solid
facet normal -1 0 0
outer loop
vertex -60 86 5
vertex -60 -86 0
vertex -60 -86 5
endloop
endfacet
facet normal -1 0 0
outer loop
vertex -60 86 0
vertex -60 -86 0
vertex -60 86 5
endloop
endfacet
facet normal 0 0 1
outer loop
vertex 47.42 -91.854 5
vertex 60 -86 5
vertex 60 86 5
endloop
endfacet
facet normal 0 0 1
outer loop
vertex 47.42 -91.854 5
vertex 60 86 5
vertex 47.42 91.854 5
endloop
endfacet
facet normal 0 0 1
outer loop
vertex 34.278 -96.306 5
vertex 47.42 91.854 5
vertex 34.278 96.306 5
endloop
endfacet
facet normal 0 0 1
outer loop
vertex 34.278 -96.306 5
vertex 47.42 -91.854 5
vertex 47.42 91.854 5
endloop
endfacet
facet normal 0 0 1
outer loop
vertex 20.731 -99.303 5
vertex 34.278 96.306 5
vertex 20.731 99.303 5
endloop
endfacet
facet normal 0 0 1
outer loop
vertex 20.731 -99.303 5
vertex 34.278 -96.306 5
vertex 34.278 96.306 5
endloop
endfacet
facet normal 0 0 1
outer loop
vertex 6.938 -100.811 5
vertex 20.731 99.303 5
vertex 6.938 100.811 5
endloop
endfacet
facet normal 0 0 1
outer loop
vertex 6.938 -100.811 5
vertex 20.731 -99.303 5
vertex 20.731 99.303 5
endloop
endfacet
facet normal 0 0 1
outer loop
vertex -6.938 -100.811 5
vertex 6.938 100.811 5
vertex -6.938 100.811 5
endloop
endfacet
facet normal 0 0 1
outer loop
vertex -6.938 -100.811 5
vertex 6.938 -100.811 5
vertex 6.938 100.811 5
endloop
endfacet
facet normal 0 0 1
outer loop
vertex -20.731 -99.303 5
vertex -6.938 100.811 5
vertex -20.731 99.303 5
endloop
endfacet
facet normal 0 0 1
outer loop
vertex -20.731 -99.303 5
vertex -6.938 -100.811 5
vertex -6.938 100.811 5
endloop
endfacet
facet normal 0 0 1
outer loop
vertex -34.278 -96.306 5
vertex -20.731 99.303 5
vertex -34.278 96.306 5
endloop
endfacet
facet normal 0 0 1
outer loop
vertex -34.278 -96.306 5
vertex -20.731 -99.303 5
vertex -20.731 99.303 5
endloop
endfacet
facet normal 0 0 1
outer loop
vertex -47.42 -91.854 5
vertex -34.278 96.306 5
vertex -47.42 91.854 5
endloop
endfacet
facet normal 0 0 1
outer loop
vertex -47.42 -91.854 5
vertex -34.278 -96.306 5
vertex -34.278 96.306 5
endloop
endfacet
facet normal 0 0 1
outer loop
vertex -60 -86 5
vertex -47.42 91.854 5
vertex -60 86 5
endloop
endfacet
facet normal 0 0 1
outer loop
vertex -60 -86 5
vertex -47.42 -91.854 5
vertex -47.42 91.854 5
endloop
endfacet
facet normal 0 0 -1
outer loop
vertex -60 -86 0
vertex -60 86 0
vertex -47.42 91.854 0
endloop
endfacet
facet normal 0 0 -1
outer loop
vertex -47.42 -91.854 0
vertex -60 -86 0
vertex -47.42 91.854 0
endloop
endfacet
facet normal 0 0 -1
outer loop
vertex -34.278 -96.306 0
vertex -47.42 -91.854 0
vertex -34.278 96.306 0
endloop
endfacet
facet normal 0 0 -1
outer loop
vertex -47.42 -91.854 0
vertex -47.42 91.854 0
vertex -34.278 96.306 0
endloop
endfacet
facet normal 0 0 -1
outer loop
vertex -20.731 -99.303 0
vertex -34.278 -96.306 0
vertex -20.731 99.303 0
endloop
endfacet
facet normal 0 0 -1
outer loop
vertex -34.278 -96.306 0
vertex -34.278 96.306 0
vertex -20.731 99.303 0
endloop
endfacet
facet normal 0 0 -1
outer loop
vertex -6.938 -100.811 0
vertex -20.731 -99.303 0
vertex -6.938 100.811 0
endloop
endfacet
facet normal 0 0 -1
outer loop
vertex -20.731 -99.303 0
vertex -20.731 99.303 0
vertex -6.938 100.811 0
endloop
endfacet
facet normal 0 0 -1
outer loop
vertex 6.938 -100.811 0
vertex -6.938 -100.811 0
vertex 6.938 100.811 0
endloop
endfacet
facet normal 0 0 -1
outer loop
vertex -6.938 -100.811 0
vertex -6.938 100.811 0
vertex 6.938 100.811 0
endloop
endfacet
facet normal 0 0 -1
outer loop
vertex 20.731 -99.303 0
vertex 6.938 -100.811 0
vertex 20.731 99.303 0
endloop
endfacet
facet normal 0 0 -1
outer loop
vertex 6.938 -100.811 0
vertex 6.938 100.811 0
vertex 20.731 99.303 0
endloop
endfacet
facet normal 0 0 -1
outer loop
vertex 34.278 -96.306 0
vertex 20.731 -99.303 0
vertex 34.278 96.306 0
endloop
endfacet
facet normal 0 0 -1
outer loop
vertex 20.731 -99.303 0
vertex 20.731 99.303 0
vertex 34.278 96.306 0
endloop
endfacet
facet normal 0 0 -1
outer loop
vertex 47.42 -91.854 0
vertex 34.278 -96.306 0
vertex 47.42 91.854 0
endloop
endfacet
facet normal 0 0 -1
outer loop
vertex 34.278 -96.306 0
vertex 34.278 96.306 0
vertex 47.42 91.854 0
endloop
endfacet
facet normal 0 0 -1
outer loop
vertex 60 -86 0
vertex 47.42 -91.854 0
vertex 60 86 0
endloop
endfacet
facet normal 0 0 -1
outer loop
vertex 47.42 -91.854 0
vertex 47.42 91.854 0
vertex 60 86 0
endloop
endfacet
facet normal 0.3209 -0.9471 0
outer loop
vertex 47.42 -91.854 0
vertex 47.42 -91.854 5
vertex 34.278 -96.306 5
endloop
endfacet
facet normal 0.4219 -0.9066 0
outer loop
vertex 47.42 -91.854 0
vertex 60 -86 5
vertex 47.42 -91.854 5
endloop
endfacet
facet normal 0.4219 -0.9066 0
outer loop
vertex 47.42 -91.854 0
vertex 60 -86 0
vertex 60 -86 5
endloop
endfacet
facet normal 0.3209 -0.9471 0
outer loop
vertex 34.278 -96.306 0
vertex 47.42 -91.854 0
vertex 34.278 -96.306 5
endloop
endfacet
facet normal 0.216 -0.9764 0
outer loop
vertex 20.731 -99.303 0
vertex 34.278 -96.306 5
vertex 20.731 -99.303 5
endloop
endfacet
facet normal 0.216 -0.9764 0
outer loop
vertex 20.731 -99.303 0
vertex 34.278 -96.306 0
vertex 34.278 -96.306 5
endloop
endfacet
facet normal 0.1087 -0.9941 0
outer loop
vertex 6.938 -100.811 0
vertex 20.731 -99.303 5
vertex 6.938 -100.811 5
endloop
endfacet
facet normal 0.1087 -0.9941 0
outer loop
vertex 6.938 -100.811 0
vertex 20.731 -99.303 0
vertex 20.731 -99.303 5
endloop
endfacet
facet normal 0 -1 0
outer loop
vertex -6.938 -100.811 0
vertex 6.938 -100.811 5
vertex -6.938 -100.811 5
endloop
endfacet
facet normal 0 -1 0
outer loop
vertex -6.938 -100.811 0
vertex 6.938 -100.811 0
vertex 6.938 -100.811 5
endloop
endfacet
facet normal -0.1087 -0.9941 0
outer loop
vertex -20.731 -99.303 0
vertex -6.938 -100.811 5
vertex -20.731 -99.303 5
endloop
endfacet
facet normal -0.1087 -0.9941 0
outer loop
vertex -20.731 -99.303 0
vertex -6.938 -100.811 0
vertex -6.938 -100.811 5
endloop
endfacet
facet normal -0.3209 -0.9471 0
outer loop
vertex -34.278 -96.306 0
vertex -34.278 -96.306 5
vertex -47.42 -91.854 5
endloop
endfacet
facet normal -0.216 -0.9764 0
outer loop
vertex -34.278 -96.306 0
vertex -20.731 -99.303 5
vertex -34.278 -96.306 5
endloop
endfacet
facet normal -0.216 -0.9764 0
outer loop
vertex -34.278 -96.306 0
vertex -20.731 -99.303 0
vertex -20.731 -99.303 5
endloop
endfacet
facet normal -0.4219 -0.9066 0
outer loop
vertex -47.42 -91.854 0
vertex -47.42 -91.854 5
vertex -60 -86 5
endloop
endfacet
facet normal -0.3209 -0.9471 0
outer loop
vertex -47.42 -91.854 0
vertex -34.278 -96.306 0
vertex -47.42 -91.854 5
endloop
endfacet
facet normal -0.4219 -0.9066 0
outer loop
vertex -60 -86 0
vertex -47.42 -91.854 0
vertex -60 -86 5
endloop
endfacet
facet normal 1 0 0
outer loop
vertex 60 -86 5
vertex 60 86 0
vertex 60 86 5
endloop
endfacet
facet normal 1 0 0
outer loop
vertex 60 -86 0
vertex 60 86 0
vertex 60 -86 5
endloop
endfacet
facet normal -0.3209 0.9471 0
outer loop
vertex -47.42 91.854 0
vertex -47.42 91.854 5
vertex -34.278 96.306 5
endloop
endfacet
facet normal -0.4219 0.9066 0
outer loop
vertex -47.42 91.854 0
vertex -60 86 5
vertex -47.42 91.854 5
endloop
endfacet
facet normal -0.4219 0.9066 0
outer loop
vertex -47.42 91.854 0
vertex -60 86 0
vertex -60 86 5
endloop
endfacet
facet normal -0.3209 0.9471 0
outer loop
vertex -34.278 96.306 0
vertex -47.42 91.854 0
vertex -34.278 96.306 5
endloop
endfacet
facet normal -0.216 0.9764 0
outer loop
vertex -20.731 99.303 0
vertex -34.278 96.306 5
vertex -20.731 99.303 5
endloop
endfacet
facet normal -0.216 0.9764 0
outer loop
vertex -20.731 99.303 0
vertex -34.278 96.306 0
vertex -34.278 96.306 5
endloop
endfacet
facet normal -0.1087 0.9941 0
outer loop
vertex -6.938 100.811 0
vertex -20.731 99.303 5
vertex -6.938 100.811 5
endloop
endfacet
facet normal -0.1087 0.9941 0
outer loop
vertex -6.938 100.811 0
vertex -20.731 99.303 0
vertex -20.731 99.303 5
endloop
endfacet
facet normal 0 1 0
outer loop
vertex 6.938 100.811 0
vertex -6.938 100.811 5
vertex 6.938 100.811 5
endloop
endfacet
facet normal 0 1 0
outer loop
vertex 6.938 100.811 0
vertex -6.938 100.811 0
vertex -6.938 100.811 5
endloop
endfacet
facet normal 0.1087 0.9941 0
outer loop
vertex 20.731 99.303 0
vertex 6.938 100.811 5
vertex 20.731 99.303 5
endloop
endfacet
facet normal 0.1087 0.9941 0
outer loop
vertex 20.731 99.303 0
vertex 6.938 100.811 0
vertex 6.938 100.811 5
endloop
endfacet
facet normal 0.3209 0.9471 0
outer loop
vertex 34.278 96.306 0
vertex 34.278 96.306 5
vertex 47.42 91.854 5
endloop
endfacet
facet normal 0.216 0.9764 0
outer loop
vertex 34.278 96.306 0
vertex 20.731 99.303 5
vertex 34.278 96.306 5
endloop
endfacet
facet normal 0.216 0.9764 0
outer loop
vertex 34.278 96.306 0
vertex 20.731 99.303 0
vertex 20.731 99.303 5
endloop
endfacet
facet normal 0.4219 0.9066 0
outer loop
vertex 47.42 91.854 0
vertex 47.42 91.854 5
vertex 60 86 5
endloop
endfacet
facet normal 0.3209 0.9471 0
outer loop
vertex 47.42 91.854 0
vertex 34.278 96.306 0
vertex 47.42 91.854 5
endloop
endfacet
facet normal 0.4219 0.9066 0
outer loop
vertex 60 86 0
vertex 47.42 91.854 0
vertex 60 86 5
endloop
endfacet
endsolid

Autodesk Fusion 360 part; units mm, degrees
sketch "Esquisse1" plane through (0, 0, 0) normal (0, 0, 1) x (1, 0, 0)
  line L0 (60, -86) -> (-60, -86)
  line L1 (-60, -86) -> (-60, 86)
  line L2 (-60, 86) -> (60, 86)
  line L3 (60, 86) -> (60, -86)
  line L4 (60, -86) -> (-60, 86) construction
  line L5 (-60, -86) -> (60, 86) construction
  dimension "d1" = 120
  dimension "d2" = 172
sketch "Esquisse2" plane through (0, 0, 0) normal (0, 0, 1) x (1, 0, 0)
  line L0 (0, -86) -> (0, -101)
  line L1 (0, 86) -> (0, 101)
  line L2 (60, -86) -> (-60, -86)
  line L3 (-60, -86) -> (-60, -116)
  line L4 (-60, -116) -> (60, -116)
  line L5 (60, -116) -> (60, -86)
  line L6 (60, -86) -> (-60, -116) construction
  line L7 (-60, -86) -> (60, -116) construction
  line L8 (-60, 86) -> (60, 86)
  line L9 (60, 86) -> (60, 116)
  line L10 (60, 116) -> (-60, 116)
  line L11 (-60, 116) -> (-60, 86)
  line L12 (-60, 86) -> (60, 116) construction
  line L13 (60, 86) -> (-60, 116) construction
  arc A0 (60, 86) -> (-60, 86) centre (0, -26.5) ccw
  arc A1 (-60, -86) -> (60, -86) centre (0, 26.5) ccw
  point P0 (0, -101)
  point P1 (0, 101)
  dimension "d3" = 15
  dimension "d4" = 15
extrude "Extrusion1" add sketch "Esquisse1" sketch "Esquisse2" along normal blind 10 of sketch 2 contours L0 L2 A1 | L0 L2 A1 | L1 L8 A0 | L1 L8 A0
sketch "Esquisse3" plane through (0, 0, 10) normal (0, 0, 1) x (-1, 0, 0)
  line L0 (60, -86) -> (60, 86)
  arc A0 (60, 86) -> (-60, 86) centre (0, -26.5) ccw
  line L1 (-60, 86) -> (-60, -86)
  arc A1 (-60, -86) -> (60, -86) centre (0, 26.5) ccw
  line L2 (60, 86) -> (-60, 86)
  line L3 (60, -86) -> (-60, -86)
  line L4 (-60, 86) -> (-60, 70)
  line L5 (-60, 70) -> (-60, 48)
  line L6 (-60, 48) -> (-60, -48)
  line L7 (-60, -48) -> (-60, -70)
  line L8 (60, 86) -> (60, 70)
  line L9 (60, 70) -> (60, 48)
  line L10 (60, 48) -> (60, -48)
  line L11 (60, -48) -> (60, -70)
  line L12 (60, 70) -> (36, 70)
  line L13 (36, 70) -> (36, 48)
  line L14 (36, 48) -> (60, 48)
  line L15 (60, -70) -> (36, -70)
  line L16 (36, -70) -> (36, -48)
  line L17 (36, -48) -> (60, -48)
  line L18 (-60, -70) -> (-36, -70)
  line L19 (-36, -70) -> (-36, -48)
  line L20 (-36, -48) -> (-60, -48)
  line L21 (-60, 70) -> (-36, 70)
  line L22 (-36, 70) -> (-36, 48)
  line L23 (-60, 48) -> (-36, 48)
  dimension "d7" = 16
  dimension "d8" = 22
  dimension "d9" = 96
  dimension "d10" = 22
  dimension "d11" = 16
  dimension "d12" = 22
  dimension "d13" = 96
  dimension "d14" = 22
  dimension "d15" = 24
  dimension "d16" = 24
  dimension "d17" = 22
sketch "Esquisse4" plane through (0, 0, 10) normal (0, 0, 1) x (-1, 0, 0)
  line L0 (-60, -86) -> (-17, -86)
  line L1 (-17, -86) -> (17, -86)
  line L2 (17, -86) -> (17, -70)
  line L3 (17, -70) -> (-17, -70)
  line L4 (-17, -70) -> (-17, -86)
  dimension "d18" = 43
  dimension "d19" = 34
extrude "Extrusion2" cut sketch "Esquisse3" against normal blind 5
extrude "Extrusion3" cut sketch "Esquisse4" along normal blind 0 and the other way blind 25
sketch "Esquisse5" plane through (0, 0, 5) normal (0, 0, 1) x (-1, 0, 0)
  arc A0 (60, 86) -> (-60, 86) centre (0, -26.5) ccw
  line L0 (-60, 86) -> (-60, -86)
  arc A1 (-60, -86) -> (60, -86) centre (0, 26.5) ccw
  line L1 (60, -86) -> (60, 86)
  line L2 (-60, 86) -> (60, 86)
  line L3 (-60, -86) -> (-60, -70)
  line L4 (-60, -70) -> (-60, -48)
  line L5 (-60, -48) -> (-60, 48)
  line L6 (-60, 48) -> (-60, 70)
  line L7 (-60, -70) -> (-36, -70)
  line L8 (-36, -70) -> (-36, -48)
  line L9 (-36, -48) -> (-60, -48)
  line L10 (-60, 70) -> (-36, 70)
  line L11 (-60, 48) -> (-36, 48)
  line L12 (-36, 48) -> (-36, 70)
  line L13 (60, -70) -> (36, -70)
  line L14 (36, -70) -> (36, -48)
  line L15 (36, -48) -> (60, -48)
  line L16 (60, 48) -> (36, 48)
  line L17 (36, 48) -> (36, 70)
  line L18 (36, 70) -> (60, 70)
  dimension "d27" = 16
  dimension "d28" = 22
  dimension "d29" = 96
  dimension "d30" = 22
  dimension "d31" = 24
  dimension "d32" = 24
sketch "Esquisse6" plane through (0, 0, 5) normal (0, 0, 1) x (-1, 0, 0)
  line L0 (27.5, -60) -> (-27.5, -60)
  line L1 (-27.5, -60) -> (-27.5, 7)
  line L2 (-27.5, 7) -> (27.5, 7)
  line L3 (27.5, 7) -> (27.5, -60)
  dimension "d34" = 55
  dimension "d35" = 67
sketch "Esquisse7" plane through (0, 0, 5) normal (0, 0, 1) x (-1, 0, 0)
  line L0 (27.5, 17) -> (-27.5, 17)
  line L1 (-27.5, 17) -> (-27.5, 83)
  line L2 (-27.5, 83) -> (27.5, 83)
  line L3 (27.5, 83) -> (27.5, 17)
  dimension "d38" = 55
  dimension "d39" = 66
sketch "Esquisse8" plane through (0, 0, 5) normal (0, 0, 1) x (-1, 0, 0)
  line L0 (17, -70) -> (-17, -70)
  line L1 (-17, -70) -> (-17, -86)
  line L2 (-17, -86) -> (17, -86)
  line L3 (17, -86) -> (17, -70)
extrude "Extrusion4" add sketch "Esquisse8" against normal blind 5
sketch "Esquisse9" plane through (0, 0, 5) normal (0, 0, 1) x (-1, 0, 0)
  line L0 (-60, -86) -> (60, -86)
